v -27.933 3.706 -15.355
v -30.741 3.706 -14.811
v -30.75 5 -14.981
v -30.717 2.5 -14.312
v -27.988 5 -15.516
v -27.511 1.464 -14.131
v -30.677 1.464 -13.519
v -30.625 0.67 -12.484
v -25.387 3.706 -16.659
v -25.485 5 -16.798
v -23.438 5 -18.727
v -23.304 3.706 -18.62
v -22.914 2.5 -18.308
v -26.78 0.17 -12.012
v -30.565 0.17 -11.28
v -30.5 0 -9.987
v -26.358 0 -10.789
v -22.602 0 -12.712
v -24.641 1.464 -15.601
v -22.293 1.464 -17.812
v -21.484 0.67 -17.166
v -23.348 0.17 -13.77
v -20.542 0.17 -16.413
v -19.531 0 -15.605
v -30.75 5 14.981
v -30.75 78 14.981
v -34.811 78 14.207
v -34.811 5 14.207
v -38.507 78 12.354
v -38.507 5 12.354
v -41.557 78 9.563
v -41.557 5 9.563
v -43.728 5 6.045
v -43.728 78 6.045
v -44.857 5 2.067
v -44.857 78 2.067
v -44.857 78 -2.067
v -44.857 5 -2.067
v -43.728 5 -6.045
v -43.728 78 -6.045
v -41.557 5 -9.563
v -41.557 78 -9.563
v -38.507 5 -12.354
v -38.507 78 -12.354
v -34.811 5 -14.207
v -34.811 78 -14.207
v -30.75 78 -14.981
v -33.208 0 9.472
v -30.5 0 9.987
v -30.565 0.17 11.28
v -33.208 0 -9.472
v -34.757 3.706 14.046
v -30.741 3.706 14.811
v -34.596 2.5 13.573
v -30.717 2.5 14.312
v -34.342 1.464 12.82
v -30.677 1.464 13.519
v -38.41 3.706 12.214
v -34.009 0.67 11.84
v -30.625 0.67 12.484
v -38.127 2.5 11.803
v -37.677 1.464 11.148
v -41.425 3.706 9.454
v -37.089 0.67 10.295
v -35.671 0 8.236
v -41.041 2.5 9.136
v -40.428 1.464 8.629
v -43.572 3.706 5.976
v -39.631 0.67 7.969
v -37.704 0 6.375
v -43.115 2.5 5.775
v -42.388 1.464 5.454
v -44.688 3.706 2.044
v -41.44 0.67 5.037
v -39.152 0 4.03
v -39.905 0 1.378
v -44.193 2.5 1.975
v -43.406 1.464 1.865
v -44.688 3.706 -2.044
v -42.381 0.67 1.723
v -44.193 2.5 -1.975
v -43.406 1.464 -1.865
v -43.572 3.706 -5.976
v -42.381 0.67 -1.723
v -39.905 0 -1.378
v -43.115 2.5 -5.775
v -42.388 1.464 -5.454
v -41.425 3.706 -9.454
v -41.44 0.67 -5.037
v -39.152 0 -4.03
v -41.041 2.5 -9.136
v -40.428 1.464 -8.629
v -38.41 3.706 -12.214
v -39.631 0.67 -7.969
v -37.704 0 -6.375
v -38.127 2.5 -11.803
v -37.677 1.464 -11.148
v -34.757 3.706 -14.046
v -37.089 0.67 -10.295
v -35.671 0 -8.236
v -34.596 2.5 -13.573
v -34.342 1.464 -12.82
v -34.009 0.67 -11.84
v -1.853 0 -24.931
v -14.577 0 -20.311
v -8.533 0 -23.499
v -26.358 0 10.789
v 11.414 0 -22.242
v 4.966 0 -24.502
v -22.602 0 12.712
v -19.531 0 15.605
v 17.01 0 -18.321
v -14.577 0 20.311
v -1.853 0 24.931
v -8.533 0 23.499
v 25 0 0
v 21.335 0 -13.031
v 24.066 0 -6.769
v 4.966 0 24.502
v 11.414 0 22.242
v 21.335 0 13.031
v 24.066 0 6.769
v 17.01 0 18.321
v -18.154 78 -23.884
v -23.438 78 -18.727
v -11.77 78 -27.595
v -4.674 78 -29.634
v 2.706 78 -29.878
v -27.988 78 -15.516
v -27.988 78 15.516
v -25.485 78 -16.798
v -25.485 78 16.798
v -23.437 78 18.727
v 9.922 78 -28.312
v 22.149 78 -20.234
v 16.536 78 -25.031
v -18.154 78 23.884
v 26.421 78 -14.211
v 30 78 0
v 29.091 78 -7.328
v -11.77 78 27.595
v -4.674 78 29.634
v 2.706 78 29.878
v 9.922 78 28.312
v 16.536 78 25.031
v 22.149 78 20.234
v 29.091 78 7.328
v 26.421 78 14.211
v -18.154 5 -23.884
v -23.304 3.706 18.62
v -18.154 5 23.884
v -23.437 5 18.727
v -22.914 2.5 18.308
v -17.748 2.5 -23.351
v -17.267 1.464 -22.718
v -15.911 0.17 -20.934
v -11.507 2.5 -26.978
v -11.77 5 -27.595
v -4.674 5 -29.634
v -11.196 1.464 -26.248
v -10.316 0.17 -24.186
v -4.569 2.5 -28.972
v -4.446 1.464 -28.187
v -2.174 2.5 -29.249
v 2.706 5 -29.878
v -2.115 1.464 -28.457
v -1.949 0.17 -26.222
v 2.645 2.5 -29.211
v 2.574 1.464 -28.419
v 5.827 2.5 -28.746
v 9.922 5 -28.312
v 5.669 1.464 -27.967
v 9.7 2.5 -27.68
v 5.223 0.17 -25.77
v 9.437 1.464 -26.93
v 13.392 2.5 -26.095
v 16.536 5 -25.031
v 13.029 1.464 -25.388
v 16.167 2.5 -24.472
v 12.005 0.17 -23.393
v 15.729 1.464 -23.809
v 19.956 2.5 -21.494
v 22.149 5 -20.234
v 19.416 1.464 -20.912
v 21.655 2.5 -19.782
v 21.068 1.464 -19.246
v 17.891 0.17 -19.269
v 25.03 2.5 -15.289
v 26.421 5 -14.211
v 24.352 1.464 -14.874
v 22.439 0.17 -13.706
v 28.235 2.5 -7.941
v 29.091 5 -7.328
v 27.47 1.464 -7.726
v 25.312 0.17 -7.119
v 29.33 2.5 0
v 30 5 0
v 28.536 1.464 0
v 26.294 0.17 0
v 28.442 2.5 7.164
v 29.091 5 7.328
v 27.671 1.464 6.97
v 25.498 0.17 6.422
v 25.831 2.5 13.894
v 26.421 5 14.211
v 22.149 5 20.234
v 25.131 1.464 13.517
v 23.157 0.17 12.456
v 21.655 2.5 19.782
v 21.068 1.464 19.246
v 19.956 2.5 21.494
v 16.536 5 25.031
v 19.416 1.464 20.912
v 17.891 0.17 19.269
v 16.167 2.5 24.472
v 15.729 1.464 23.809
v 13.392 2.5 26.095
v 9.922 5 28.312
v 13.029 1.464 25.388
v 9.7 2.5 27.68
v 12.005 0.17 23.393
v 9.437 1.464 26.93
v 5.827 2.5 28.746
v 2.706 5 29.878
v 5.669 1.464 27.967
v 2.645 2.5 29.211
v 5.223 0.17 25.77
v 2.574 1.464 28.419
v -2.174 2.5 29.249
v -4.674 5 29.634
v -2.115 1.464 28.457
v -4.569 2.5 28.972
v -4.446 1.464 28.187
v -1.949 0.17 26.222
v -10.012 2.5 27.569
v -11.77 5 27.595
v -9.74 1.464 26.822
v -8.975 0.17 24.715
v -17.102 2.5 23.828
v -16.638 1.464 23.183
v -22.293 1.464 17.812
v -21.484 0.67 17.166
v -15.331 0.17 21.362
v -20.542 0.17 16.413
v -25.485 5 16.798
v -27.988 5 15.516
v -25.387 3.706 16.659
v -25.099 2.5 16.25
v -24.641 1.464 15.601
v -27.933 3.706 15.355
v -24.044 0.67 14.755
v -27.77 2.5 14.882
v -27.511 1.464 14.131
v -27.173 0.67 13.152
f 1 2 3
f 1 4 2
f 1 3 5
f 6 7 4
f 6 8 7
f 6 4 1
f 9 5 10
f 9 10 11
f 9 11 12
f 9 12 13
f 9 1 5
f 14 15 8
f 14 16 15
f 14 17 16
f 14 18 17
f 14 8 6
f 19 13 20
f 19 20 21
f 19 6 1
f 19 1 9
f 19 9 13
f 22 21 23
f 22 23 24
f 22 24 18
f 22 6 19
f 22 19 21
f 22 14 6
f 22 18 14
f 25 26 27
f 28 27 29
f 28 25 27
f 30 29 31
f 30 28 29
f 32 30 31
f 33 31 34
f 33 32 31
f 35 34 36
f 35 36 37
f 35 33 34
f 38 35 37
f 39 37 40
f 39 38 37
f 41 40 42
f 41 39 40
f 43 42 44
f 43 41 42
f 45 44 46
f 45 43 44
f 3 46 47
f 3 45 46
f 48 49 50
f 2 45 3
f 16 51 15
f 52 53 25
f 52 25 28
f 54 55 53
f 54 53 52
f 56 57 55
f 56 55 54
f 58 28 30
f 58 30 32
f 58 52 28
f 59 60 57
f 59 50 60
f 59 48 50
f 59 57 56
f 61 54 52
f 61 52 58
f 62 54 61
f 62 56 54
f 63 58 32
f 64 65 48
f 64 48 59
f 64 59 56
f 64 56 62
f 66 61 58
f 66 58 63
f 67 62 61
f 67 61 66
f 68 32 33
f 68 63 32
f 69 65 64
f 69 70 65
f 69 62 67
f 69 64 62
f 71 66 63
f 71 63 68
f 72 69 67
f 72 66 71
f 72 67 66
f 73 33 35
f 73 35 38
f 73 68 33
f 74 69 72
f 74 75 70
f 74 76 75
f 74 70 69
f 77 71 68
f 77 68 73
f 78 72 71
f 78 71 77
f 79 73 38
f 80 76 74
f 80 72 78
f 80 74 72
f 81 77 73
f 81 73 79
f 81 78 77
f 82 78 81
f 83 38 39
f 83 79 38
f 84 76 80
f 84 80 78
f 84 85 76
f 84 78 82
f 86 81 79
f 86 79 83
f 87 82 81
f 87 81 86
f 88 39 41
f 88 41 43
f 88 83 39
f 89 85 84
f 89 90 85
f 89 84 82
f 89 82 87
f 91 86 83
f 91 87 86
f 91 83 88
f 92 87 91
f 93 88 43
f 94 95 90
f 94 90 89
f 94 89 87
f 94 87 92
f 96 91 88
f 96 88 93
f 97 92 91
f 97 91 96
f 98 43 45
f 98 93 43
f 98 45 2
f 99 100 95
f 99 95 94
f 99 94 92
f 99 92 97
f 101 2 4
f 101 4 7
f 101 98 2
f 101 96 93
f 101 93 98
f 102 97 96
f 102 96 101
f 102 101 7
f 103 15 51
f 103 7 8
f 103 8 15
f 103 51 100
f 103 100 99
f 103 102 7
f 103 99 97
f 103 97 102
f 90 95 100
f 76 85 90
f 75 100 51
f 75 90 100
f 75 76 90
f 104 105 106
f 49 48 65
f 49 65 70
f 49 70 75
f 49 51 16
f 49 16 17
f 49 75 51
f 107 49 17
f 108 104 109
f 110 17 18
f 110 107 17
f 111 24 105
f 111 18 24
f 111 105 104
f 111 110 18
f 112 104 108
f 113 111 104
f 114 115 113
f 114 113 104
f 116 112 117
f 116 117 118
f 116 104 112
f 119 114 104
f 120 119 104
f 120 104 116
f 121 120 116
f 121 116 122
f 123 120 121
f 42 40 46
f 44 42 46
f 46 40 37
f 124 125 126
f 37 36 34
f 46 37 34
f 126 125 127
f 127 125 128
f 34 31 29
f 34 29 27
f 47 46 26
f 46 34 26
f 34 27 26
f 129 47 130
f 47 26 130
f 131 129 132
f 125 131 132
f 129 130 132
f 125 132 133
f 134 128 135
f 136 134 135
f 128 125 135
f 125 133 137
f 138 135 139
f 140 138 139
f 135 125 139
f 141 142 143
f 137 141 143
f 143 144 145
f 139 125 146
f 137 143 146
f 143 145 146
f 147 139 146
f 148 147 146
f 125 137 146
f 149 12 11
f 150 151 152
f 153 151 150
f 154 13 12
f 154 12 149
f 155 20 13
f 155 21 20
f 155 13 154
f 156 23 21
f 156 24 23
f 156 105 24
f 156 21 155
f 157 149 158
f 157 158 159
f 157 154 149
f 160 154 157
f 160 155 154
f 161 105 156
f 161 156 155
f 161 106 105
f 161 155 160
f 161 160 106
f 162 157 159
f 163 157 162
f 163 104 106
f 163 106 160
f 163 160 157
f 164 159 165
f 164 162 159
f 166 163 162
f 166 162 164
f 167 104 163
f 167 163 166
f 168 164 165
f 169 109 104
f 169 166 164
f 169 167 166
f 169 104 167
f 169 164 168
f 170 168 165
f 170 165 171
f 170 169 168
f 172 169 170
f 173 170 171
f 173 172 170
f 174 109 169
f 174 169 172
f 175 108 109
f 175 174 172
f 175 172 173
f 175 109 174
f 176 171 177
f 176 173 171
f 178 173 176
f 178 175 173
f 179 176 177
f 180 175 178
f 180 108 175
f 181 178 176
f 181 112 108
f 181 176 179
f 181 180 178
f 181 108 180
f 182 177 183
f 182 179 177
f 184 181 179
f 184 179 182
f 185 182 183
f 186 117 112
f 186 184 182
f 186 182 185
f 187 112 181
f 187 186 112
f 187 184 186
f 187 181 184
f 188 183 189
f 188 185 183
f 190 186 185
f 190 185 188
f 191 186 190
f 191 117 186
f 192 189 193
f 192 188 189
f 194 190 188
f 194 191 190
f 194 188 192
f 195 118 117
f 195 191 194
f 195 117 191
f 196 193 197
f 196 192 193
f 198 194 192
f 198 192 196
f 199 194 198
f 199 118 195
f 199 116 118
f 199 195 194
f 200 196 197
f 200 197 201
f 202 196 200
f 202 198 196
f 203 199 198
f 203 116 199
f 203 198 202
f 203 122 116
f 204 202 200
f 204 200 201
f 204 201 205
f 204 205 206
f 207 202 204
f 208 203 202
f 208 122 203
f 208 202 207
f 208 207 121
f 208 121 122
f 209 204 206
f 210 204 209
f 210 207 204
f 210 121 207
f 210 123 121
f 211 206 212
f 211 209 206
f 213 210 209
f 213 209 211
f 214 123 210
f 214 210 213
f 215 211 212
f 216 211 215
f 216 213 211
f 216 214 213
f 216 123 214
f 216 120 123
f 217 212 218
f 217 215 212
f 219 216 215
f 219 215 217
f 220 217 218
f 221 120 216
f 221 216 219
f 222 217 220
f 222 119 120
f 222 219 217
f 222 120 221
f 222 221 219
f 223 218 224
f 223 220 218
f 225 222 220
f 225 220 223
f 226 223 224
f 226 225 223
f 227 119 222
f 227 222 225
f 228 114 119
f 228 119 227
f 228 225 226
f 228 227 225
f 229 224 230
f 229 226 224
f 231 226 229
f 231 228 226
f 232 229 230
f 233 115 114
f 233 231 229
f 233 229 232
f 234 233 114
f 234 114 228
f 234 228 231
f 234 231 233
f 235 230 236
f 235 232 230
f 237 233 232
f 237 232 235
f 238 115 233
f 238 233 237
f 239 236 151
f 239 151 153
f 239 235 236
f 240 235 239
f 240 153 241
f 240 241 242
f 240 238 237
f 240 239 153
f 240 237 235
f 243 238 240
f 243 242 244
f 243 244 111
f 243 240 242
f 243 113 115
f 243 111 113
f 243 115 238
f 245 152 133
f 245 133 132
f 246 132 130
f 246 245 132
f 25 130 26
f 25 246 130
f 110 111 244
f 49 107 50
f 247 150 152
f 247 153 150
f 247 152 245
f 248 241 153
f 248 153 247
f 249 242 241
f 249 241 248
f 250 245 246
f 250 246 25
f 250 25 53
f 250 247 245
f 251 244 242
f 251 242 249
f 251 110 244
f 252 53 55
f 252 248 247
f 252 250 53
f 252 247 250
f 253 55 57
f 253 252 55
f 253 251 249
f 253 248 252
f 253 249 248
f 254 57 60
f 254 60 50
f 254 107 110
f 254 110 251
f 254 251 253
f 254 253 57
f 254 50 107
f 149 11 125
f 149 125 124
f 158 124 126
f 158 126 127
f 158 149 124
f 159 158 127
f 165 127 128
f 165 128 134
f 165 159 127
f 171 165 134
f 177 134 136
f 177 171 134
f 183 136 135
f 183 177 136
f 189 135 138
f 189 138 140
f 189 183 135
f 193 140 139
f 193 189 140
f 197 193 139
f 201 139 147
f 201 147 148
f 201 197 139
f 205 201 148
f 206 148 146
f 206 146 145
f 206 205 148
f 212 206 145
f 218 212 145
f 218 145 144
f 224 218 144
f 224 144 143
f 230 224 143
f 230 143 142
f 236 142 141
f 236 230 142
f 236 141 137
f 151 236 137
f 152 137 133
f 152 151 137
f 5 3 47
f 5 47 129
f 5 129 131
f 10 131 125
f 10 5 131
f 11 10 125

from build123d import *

# Parameters (mm, degrees)
F1_DEPTH = 78
F2_R     = 5


# Not quite as in the source:
# - a feature of the source that left no trace in its solid (it failed there, or was rolled back) is left out


with BuildPart() as f1:
    # F0 (on Front) → F1 (new body)
    with BuildSketch(Plane.XZ):
        with BuildLine():
            ThreePointArc((-30.75, -14.9812382666), (-26.6913543678, -16.0682388848), (-23.4375, -18.7265478332))
            ThreePointArc((-23.4375, -18.7265478332), (30, 0), (-23.4375, 18.7265478332))
            ThreePointArc((-23.4375, 18.7265478332), (-26.6913543678, 16.0682388848), (-30.75, 14.9812382666))
            ThreePointArc((-30.75, 14.9812382666), (-45, 0), (-30.75, -14.9812382666))
        make_face()
    extrude(amount=-F1_DEPTH)

    # F2
    f2_edges = [f1.edges().sort_by_distance(p)[0] for p in [
        (30, 0, 0),
        (-26.691354, 0, 16.068239),
        (-45, 0, 0),
        (-26.691354, 0, -16.068239),
    ]]
    fillet(f2_edges, radius=F2_R)


solid = f1.part
